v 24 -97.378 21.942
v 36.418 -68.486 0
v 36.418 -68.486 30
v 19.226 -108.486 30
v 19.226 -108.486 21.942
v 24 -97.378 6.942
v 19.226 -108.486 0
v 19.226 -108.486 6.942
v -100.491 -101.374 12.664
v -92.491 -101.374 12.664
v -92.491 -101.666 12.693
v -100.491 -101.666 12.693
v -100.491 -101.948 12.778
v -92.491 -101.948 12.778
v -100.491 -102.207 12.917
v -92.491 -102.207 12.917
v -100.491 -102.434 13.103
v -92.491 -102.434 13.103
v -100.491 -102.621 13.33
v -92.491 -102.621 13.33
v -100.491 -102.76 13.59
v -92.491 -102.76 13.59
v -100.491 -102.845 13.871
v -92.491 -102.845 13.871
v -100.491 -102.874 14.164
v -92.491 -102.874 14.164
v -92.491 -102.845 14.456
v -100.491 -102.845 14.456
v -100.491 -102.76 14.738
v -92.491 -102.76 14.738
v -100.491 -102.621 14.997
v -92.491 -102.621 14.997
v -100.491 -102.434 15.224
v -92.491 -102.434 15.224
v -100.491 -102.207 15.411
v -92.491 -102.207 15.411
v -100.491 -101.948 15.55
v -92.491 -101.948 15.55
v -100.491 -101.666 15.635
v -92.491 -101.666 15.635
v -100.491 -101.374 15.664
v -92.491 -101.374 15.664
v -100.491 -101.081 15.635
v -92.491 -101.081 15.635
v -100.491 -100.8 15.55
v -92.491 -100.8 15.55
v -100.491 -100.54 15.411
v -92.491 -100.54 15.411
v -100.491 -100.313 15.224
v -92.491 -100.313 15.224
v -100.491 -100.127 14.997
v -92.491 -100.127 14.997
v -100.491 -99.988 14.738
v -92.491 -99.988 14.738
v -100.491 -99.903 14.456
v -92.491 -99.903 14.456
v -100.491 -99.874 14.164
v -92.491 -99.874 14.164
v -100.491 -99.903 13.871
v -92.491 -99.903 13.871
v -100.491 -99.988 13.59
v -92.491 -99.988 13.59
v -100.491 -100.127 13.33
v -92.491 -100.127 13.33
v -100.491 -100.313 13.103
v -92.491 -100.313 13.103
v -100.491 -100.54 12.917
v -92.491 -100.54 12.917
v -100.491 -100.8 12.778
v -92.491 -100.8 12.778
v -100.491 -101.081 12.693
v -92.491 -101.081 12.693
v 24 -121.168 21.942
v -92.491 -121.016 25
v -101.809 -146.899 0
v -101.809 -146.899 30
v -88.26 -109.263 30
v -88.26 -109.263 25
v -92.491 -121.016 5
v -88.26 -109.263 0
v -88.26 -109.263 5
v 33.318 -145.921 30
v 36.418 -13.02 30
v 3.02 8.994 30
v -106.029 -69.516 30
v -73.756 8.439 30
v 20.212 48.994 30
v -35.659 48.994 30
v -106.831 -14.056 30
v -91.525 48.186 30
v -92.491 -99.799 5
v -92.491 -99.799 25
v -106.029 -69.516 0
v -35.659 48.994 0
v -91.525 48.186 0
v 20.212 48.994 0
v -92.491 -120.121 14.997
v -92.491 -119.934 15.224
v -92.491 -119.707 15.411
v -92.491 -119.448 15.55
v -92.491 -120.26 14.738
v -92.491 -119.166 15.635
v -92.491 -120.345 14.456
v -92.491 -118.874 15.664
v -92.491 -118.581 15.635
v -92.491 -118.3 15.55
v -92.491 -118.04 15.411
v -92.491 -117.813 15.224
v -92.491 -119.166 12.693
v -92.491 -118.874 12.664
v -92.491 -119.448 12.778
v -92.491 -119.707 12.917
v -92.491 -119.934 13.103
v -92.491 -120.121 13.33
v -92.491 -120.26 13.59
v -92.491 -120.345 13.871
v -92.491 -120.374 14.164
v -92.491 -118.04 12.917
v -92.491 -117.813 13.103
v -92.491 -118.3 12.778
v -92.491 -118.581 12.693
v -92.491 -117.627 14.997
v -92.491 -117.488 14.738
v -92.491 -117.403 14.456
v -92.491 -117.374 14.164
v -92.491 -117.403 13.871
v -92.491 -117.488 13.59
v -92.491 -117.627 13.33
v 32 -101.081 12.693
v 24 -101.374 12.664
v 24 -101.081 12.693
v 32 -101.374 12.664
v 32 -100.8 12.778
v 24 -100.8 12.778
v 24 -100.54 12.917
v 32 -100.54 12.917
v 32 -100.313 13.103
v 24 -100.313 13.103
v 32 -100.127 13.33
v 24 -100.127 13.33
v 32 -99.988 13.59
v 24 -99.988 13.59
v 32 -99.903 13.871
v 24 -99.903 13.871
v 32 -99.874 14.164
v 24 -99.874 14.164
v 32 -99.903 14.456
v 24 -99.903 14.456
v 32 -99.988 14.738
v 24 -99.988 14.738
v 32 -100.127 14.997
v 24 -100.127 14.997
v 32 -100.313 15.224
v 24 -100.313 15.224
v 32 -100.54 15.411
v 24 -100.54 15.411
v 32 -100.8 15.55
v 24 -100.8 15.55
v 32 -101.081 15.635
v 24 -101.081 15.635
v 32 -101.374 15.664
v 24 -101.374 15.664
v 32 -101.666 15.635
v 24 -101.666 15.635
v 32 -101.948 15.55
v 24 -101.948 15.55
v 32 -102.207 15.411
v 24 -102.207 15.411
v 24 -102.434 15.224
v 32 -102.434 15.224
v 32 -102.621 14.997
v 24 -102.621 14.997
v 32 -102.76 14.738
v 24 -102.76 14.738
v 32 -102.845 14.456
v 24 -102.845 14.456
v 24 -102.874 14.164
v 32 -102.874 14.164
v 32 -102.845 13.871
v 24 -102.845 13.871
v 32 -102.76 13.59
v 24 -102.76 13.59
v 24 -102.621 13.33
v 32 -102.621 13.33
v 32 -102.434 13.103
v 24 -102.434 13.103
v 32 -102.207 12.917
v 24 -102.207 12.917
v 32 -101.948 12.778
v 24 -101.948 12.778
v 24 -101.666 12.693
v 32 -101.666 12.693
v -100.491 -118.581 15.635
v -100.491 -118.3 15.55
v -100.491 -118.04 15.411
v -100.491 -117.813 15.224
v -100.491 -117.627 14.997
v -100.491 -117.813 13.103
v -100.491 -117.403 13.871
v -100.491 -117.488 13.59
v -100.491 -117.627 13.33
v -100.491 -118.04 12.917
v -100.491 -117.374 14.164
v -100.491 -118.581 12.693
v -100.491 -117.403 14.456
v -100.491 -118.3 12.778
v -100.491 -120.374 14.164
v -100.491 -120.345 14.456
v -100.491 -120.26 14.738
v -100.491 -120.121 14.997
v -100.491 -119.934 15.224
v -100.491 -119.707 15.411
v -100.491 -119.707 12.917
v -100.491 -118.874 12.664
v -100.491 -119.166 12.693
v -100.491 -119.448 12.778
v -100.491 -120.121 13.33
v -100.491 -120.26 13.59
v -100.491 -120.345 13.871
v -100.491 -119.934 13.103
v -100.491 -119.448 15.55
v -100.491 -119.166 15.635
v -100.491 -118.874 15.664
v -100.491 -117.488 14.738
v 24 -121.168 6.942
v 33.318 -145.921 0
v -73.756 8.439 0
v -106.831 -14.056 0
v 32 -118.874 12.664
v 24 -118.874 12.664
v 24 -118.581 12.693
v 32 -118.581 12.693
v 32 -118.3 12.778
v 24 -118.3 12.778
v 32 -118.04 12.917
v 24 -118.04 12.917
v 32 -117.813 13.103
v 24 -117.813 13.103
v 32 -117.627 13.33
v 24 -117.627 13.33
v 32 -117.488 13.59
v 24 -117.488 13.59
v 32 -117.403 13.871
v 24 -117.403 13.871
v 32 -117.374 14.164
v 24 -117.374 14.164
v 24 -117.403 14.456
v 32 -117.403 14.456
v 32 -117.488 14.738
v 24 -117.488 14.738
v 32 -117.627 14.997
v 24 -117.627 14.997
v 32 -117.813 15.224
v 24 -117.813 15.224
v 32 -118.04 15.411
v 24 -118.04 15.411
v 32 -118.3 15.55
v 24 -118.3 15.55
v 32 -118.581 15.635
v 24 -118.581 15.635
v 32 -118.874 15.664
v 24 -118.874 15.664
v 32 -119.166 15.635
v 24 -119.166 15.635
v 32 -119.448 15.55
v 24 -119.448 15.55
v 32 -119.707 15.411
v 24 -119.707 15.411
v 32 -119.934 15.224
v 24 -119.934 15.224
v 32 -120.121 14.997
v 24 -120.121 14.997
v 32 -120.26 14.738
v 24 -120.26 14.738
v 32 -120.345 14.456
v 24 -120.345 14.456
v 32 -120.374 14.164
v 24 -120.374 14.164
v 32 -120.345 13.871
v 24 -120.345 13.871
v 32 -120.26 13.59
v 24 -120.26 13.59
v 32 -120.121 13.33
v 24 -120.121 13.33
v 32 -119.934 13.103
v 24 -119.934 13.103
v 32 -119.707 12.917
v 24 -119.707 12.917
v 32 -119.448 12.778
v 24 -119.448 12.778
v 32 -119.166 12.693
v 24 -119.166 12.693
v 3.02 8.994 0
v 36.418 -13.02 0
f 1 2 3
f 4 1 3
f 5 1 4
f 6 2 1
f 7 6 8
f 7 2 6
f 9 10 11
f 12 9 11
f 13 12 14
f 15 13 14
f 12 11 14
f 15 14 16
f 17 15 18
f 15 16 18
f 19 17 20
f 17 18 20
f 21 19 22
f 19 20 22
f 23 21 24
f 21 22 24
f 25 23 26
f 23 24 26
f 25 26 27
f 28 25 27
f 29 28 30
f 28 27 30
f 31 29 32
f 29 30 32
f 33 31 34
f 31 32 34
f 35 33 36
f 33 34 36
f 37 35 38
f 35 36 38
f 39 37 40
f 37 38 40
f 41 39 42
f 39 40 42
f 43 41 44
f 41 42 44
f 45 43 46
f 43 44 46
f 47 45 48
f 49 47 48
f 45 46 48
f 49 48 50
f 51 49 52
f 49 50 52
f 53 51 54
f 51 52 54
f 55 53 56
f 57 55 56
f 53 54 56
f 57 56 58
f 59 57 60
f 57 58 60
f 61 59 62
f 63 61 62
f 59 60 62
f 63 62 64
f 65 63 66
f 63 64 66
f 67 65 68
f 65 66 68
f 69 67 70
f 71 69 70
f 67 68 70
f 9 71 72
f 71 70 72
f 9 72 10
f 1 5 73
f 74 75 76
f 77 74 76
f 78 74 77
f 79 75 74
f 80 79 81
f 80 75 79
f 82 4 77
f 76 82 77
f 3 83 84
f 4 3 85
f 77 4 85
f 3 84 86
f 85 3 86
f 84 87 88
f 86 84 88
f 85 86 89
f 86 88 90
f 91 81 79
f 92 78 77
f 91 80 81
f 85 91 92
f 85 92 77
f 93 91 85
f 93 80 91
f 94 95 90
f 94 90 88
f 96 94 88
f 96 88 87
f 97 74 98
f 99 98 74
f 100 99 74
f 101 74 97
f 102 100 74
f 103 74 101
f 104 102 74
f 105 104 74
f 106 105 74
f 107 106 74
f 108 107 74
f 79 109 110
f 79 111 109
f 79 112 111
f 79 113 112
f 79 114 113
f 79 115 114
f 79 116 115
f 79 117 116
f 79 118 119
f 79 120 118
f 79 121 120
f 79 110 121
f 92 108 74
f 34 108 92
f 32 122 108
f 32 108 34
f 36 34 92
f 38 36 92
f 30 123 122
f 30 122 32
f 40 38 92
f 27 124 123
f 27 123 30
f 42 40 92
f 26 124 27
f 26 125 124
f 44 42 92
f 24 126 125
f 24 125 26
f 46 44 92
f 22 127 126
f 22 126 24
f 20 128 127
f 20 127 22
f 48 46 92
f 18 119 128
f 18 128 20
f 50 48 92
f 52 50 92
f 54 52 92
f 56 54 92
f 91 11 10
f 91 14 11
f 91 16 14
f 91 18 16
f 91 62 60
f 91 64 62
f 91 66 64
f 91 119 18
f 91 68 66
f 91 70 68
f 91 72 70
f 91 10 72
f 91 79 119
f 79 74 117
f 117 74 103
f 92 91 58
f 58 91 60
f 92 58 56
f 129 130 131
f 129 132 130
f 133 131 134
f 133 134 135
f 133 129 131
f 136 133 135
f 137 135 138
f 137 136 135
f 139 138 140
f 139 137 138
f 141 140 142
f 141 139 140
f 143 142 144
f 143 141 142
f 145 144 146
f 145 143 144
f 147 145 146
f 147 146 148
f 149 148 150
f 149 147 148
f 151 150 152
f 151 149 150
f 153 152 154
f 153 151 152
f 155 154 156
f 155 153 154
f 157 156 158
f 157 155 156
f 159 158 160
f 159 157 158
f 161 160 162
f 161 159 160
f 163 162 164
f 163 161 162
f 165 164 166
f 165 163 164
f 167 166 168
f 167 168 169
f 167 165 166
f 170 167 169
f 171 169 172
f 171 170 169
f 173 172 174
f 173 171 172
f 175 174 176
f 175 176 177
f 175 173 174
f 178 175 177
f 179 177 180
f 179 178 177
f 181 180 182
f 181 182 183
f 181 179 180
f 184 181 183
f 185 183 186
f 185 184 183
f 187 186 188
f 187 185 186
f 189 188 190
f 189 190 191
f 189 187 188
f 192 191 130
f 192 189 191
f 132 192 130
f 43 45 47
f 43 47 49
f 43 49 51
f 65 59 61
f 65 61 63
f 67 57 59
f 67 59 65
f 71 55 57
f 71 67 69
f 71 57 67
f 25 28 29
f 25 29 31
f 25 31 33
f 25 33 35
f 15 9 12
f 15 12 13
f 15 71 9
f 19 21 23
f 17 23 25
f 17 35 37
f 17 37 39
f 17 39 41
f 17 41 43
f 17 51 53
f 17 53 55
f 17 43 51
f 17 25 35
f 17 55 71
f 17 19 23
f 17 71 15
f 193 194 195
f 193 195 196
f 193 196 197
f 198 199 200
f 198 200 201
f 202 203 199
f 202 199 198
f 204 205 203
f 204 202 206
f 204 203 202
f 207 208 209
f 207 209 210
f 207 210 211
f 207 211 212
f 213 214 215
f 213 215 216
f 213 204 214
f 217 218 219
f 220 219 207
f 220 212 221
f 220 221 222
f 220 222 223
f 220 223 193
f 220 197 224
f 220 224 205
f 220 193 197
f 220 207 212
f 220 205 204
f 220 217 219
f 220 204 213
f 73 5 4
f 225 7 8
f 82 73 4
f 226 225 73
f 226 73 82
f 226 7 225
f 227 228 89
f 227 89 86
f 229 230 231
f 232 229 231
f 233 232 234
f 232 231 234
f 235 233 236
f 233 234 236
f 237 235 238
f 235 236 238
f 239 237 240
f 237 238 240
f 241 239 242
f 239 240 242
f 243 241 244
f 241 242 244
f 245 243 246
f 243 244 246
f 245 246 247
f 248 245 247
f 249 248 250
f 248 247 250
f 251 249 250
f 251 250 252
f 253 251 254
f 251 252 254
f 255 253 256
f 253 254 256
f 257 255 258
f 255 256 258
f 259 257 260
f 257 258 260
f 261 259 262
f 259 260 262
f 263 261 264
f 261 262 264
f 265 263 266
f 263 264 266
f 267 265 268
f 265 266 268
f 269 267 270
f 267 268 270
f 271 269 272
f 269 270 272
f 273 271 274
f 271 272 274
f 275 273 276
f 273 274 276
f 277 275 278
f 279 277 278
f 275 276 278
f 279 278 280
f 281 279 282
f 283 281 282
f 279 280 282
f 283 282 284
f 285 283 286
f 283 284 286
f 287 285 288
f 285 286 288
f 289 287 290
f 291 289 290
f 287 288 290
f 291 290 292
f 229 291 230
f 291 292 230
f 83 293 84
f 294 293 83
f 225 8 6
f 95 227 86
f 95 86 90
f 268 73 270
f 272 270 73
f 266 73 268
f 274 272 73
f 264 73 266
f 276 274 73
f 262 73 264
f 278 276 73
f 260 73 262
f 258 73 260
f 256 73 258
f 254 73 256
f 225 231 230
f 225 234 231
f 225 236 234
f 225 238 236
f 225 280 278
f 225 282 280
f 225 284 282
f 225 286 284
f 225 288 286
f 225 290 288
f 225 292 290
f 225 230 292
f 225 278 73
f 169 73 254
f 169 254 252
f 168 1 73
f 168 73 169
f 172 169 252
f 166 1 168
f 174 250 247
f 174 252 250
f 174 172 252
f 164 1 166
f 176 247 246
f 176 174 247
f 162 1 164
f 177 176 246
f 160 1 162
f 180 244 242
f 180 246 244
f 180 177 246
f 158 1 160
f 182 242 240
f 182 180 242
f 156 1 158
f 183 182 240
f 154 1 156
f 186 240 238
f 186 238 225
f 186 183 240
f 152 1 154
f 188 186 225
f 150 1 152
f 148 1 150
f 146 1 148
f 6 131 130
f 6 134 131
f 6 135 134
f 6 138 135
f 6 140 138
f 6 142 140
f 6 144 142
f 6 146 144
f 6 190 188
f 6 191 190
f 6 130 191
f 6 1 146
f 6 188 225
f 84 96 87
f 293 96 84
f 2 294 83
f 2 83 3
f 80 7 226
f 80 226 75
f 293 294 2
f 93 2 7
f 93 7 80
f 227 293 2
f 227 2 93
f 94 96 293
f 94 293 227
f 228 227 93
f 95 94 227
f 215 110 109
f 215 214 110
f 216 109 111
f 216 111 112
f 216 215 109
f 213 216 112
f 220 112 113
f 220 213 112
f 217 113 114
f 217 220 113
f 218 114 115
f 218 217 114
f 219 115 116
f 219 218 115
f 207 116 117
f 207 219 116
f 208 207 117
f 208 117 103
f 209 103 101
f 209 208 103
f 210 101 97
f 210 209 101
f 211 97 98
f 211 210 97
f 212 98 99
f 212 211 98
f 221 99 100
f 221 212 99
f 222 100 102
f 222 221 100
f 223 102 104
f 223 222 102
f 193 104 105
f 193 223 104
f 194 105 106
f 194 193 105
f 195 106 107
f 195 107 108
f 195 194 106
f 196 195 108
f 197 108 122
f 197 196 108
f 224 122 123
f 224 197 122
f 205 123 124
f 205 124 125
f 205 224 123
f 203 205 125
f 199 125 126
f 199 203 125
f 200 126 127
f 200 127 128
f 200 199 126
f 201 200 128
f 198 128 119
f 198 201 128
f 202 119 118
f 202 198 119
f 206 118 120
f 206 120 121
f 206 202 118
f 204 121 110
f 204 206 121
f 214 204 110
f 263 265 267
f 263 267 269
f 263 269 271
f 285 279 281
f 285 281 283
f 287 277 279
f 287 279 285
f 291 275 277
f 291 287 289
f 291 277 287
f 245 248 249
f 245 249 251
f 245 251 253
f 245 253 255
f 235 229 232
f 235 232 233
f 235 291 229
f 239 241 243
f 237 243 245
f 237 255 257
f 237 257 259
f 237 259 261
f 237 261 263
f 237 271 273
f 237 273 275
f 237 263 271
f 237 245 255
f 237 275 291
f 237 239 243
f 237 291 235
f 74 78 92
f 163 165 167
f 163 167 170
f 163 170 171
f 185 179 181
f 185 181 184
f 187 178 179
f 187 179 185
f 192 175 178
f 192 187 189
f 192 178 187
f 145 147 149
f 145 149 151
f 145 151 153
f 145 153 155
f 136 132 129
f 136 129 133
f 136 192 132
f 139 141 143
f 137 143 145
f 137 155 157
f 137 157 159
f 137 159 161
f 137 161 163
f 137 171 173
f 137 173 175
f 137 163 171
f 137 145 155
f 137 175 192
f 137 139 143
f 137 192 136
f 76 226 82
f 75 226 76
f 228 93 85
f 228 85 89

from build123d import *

# Parameters (mm, degrees)
BOSS_EXTRUDE1_DEPTH = 30
SKETCH6_W           = 15
SKETCH6_H           = 30
BOSS_EXTRUDE2_DEPTH = 24
BOSS_EXTRUDE5_DEPTH = 10
SKETCH15_R          = 1.5
BOSS_EXTRUDE7_DEPTH = 8
SKETCH7_R           = 1.5
BOSS_EXTRUDE8_DEPTH = 8


with BuildPart() as part:
    # Sketch2 → Boss-Extrude1 (new body)
    with BuildSketch(Plane.XY):
        Polygon((-35.659220441, 48.994166095), (20.212047263, 48.994166095), (3.020324726, 8.994166095), (36.417587641, -13.019984577), (36.417587641, -68.485610583), (19.225865104, -108.485610583), (33.318130441, -145.920995684), (-101.80917988, -146.898605829), (-88.260031439, -109.263242453), (-106.02870282, -69.516171603), (-106.831218915, -14.056351587), (-73.755968311, 8.438710038), (-91.524639692, 48.185780888), align=None)
    extrude(amount=BOSS_EXTRUDE1_DEPTH)

    # Sketch6 → Boss-Extrude2 (add)
    with BuildSketch(Plane(origin=(0, 0, 0), x_dir=(0, 0, -1), z_dir=(1, 0, 0))):
        with Locations((-14.441506787, -108.571370402)):
            Rectangle(SKETCH6_W, SKETCH6_H)
    extrude(amount=BOSS_EXTRUDE2_DEPTH)

    # Sketch13 → Boss-Extrude5 (add, symmetric)
    with BuildSketch(Plane(origin=(0, 0, 15), x_dir=(-1, 0, 0), z_dir=(0, 0, -1))):
        Polygon((92.491049439, -97.377625596), (87.716914543, -108.485610583), (92.491049439, -121.167856773), align=None)
    extrude(amount=BOSS_EXTRUDE5_DEPTH, both=True)

    # Sketch15 → Boss-Extrude7 (add, symmetric)
    with BuildSketch(Plane.ZY.offset(92.491049439)):
        with Locations(Location((14.163706185, -101.373718374, 0), (0, 0, 180))):
            Circle(SKETCH15_R)
        with Locations(Location((14.163706185, -118.873718374, 0), (0, 0, 180))):
            Circle(SKETCH15_R)
    extrude(amount=BOSS_EXTRUDE7_DEPTH, both=True)

    # Sketch7 → Boss-Extrude8 (add, symmetric)
    with BuildSketch(Plane(origin=(24, 0, 0), x_dir=(0, 0, -1), z_dir=(1, 0, 0))):
        with Locations((-14.163706185, -118.873718374)):
            Circle(SKETCH7_R)
        with Locations((-14.163706185, -101.373718374)):
            Circle(SKETCH7_R)
    extrude(amount=BOSS_EXTRUDE8_DEPTH, both=True)


solid = part.part
